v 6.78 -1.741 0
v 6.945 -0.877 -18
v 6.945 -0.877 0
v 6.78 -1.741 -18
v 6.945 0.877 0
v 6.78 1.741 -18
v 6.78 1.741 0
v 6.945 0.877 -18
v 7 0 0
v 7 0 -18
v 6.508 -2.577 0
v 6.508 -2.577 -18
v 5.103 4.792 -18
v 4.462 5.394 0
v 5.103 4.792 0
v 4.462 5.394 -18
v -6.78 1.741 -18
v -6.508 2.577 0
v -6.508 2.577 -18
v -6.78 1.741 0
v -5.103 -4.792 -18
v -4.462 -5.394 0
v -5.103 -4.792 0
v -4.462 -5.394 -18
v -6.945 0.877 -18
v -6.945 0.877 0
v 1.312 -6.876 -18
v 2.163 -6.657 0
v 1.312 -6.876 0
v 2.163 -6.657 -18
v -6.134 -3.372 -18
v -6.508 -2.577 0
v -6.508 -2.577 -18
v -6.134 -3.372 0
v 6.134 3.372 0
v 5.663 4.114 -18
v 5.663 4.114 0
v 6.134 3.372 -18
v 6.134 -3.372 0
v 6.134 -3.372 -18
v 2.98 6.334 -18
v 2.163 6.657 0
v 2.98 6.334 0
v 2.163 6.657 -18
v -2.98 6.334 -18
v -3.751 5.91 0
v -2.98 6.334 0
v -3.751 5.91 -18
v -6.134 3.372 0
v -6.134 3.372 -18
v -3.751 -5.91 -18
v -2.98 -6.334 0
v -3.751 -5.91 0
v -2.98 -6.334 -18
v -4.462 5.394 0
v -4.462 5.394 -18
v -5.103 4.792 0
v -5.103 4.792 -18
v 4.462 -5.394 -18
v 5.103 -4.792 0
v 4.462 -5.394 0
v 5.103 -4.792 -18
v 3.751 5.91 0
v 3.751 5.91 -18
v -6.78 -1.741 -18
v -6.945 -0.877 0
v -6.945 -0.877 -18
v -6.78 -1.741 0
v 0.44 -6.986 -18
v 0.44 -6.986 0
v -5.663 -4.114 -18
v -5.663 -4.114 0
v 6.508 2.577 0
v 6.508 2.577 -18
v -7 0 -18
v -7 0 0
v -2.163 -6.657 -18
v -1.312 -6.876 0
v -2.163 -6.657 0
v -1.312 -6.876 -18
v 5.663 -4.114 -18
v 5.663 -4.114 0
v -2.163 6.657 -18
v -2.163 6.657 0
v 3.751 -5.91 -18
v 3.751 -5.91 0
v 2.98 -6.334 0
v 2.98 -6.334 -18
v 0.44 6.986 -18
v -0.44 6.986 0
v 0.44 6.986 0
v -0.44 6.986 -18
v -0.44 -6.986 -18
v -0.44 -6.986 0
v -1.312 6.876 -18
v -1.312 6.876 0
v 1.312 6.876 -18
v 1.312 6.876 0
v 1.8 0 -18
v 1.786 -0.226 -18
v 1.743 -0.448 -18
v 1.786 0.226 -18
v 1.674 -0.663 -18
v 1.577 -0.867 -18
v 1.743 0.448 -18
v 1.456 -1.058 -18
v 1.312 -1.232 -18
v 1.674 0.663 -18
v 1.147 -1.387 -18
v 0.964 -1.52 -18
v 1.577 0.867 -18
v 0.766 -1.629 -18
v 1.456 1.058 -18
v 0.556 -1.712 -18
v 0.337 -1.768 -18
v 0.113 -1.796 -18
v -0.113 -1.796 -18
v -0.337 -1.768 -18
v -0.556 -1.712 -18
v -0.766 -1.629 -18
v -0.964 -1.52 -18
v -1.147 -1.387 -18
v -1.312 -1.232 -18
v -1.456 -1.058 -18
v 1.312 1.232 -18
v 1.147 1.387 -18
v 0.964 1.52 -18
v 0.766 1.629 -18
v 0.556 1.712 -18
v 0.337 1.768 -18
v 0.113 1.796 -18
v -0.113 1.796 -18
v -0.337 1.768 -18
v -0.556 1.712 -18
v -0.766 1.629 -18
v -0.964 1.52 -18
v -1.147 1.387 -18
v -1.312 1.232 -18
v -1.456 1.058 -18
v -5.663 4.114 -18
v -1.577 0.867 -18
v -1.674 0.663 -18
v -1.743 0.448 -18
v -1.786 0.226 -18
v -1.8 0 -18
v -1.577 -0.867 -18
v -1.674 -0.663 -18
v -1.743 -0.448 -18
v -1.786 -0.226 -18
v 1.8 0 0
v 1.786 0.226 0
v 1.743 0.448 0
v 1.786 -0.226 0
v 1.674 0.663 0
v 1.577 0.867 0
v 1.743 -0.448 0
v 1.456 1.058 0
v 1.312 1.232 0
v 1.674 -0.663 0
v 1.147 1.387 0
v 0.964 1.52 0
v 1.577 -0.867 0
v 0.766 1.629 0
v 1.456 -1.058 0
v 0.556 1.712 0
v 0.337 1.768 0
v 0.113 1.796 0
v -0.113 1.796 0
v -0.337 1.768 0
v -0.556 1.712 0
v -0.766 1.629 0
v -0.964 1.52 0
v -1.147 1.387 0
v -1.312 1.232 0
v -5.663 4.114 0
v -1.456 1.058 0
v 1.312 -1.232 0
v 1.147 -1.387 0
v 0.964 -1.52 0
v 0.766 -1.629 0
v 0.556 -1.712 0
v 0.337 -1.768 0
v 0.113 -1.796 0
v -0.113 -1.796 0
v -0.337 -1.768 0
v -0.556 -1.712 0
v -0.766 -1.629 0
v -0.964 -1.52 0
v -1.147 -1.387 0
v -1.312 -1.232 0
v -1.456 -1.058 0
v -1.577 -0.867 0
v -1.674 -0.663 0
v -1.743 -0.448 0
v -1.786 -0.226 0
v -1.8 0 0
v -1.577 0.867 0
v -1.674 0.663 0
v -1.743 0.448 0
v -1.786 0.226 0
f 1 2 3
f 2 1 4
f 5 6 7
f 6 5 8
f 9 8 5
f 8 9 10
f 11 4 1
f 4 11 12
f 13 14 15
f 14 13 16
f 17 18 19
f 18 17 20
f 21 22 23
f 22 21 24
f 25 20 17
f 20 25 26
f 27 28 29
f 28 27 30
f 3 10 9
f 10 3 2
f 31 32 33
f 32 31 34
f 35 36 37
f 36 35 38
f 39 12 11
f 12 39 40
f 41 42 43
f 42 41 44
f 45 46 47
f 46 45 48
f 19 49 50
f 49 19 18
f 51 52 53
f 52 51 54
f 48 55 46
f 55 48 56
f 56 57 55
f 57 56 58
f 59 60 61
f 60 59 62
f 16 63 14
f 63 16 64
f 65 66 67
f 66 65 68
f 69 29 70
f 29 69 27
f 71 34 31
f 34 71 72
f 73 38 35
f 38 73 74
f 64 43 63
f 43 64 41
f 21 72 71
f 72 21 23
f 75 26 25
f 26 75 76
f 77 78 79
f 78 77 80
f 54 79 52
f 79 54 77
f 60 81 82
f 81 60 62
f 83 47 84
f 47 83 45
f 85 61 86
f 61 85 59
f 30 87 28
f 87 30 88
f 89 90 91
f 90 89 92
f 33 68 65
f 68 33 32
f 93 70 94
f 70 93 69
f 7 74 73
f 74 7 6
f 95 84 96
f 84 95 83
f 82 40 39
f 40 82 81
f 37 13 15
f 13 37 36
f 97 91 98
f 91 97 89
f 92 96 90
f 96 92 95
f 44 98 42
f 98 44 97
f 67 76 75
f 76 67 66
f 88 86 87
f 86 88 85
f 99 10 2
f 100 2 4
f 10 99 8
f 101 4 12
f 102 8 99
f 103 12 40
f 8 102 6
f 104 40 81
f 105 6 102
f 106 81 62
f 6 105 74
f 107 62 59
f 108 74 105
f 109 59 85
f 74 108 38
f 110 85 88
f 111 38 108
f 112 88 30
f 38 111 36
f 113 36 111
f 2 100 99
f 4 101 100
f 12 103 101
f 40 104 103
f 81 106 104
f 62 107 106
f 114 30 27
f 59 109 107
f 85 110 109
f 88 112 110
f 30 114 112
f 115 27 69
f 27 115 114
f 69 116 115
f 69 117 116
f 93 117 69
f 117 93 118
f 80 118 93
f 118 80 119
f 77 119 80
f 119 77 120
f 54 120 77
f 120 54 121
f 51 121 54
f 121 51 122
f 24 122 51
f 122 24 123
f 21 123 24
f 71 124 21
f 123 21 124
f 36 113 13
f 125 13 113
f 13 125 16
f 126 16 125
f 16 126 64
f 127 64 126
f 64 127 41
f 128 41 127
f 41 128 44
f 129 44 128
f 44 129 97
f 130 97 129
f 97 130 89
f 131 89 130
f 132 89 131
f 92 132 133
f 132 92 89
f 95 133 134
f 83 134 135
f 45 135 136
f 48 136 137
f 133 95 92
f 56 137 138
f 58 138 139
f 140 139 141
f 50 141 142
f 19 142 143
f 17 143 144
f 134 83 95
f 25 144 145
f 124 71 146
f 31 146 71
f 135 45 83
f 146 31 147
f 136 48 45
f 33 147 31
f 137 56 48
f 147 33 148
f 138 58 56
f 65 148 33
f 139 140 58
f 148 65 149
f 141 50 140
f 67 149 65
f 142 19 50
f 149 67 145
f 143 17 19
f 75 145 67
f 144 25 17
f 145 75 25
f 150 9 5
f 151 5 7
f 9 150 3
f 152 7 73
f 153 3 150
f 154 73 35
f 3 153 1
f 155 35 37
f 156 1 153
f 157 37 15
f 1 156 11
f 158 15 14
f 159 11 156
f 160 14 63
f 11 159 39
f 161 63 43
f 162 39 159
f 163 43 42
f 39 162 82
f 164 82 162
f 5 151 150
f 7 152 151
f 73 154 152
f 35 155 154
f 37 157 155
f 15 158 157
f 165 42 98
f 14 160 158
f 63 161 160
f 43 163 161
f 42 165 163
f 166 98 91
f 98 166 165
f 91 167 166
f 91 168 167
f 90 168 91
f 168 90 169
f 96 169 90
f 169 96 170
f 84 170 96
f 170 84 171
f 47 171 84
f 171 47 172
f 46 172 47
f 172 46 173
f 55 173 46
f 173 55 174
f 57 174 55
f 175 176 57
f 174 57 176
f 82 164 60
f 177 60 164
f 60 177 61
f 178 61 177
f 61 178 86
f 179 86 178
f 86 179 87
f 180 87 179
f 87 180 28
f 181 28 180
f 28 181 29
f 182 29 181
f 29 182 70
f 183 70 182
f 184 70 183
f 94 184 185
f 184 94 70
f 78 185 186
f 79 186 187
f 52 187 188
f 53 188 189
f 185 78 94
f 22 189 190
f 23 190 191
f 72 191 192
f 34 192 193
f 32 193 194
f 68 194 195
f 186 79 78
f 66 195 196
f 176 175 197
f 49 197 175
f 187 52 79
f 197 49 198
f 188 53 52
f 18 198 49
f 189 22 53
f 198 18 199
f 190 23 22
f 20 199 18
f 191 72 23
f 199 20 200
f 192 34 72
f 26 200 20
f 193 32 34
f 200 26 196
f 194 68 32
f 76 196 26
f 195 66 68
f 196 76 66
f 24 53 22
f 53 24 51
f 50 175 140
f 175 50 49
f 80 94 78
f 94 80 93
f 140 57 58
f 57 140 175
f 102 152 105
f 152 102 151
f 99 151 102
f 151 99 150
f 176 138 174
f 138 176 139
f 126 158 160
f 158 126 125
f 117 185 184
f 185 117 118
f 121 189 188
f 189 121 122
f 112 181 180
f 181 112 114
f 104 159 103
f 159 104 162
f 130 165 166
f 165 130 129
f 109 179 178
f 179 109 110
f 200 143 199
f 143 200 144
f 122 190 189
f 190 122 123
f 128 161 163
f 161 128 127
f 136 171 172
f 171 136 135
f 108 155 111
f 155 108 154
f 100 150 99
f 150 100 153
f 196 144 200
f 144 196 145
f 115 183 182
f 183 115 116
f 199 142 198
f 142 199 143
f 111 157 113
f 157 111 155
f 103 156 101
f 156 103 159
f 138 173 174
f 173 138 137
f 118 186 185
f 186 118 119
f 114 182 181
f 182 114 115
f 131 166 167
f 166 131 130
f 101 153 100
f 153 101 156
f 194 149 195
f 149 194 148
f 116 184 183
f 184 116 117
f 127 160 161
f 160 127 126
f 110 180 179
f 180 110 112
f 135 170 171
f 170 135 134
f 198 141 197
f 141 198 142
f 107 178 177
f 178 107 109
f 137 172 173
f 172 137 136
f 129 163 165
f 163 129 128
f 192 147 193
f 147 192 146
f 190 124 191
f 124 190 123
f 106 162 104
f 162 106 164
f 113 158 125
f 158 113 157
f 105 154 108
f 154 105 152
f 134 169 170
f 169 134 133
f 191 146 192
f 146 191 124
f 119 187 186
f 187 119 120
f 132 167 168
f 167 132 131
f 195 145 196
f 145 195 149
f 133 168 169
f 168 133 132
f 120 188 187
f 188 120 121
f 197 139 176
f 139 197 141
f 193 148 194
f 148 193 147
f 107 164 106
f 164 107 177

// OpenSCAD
$fn = 50;


difference() {
	union() {
		translate(v = [0, 0, -18.0000000000]) {
			cylinder(h = 18, r = 7.0000000000);
		}
		cylinder(h = 0, r = 17.0000000000);
	}
	union() {
		#translate(v = [0, 0, -18]) {
			cylinder(h = 18, r = 1.8000000000);
		}
	}
}
